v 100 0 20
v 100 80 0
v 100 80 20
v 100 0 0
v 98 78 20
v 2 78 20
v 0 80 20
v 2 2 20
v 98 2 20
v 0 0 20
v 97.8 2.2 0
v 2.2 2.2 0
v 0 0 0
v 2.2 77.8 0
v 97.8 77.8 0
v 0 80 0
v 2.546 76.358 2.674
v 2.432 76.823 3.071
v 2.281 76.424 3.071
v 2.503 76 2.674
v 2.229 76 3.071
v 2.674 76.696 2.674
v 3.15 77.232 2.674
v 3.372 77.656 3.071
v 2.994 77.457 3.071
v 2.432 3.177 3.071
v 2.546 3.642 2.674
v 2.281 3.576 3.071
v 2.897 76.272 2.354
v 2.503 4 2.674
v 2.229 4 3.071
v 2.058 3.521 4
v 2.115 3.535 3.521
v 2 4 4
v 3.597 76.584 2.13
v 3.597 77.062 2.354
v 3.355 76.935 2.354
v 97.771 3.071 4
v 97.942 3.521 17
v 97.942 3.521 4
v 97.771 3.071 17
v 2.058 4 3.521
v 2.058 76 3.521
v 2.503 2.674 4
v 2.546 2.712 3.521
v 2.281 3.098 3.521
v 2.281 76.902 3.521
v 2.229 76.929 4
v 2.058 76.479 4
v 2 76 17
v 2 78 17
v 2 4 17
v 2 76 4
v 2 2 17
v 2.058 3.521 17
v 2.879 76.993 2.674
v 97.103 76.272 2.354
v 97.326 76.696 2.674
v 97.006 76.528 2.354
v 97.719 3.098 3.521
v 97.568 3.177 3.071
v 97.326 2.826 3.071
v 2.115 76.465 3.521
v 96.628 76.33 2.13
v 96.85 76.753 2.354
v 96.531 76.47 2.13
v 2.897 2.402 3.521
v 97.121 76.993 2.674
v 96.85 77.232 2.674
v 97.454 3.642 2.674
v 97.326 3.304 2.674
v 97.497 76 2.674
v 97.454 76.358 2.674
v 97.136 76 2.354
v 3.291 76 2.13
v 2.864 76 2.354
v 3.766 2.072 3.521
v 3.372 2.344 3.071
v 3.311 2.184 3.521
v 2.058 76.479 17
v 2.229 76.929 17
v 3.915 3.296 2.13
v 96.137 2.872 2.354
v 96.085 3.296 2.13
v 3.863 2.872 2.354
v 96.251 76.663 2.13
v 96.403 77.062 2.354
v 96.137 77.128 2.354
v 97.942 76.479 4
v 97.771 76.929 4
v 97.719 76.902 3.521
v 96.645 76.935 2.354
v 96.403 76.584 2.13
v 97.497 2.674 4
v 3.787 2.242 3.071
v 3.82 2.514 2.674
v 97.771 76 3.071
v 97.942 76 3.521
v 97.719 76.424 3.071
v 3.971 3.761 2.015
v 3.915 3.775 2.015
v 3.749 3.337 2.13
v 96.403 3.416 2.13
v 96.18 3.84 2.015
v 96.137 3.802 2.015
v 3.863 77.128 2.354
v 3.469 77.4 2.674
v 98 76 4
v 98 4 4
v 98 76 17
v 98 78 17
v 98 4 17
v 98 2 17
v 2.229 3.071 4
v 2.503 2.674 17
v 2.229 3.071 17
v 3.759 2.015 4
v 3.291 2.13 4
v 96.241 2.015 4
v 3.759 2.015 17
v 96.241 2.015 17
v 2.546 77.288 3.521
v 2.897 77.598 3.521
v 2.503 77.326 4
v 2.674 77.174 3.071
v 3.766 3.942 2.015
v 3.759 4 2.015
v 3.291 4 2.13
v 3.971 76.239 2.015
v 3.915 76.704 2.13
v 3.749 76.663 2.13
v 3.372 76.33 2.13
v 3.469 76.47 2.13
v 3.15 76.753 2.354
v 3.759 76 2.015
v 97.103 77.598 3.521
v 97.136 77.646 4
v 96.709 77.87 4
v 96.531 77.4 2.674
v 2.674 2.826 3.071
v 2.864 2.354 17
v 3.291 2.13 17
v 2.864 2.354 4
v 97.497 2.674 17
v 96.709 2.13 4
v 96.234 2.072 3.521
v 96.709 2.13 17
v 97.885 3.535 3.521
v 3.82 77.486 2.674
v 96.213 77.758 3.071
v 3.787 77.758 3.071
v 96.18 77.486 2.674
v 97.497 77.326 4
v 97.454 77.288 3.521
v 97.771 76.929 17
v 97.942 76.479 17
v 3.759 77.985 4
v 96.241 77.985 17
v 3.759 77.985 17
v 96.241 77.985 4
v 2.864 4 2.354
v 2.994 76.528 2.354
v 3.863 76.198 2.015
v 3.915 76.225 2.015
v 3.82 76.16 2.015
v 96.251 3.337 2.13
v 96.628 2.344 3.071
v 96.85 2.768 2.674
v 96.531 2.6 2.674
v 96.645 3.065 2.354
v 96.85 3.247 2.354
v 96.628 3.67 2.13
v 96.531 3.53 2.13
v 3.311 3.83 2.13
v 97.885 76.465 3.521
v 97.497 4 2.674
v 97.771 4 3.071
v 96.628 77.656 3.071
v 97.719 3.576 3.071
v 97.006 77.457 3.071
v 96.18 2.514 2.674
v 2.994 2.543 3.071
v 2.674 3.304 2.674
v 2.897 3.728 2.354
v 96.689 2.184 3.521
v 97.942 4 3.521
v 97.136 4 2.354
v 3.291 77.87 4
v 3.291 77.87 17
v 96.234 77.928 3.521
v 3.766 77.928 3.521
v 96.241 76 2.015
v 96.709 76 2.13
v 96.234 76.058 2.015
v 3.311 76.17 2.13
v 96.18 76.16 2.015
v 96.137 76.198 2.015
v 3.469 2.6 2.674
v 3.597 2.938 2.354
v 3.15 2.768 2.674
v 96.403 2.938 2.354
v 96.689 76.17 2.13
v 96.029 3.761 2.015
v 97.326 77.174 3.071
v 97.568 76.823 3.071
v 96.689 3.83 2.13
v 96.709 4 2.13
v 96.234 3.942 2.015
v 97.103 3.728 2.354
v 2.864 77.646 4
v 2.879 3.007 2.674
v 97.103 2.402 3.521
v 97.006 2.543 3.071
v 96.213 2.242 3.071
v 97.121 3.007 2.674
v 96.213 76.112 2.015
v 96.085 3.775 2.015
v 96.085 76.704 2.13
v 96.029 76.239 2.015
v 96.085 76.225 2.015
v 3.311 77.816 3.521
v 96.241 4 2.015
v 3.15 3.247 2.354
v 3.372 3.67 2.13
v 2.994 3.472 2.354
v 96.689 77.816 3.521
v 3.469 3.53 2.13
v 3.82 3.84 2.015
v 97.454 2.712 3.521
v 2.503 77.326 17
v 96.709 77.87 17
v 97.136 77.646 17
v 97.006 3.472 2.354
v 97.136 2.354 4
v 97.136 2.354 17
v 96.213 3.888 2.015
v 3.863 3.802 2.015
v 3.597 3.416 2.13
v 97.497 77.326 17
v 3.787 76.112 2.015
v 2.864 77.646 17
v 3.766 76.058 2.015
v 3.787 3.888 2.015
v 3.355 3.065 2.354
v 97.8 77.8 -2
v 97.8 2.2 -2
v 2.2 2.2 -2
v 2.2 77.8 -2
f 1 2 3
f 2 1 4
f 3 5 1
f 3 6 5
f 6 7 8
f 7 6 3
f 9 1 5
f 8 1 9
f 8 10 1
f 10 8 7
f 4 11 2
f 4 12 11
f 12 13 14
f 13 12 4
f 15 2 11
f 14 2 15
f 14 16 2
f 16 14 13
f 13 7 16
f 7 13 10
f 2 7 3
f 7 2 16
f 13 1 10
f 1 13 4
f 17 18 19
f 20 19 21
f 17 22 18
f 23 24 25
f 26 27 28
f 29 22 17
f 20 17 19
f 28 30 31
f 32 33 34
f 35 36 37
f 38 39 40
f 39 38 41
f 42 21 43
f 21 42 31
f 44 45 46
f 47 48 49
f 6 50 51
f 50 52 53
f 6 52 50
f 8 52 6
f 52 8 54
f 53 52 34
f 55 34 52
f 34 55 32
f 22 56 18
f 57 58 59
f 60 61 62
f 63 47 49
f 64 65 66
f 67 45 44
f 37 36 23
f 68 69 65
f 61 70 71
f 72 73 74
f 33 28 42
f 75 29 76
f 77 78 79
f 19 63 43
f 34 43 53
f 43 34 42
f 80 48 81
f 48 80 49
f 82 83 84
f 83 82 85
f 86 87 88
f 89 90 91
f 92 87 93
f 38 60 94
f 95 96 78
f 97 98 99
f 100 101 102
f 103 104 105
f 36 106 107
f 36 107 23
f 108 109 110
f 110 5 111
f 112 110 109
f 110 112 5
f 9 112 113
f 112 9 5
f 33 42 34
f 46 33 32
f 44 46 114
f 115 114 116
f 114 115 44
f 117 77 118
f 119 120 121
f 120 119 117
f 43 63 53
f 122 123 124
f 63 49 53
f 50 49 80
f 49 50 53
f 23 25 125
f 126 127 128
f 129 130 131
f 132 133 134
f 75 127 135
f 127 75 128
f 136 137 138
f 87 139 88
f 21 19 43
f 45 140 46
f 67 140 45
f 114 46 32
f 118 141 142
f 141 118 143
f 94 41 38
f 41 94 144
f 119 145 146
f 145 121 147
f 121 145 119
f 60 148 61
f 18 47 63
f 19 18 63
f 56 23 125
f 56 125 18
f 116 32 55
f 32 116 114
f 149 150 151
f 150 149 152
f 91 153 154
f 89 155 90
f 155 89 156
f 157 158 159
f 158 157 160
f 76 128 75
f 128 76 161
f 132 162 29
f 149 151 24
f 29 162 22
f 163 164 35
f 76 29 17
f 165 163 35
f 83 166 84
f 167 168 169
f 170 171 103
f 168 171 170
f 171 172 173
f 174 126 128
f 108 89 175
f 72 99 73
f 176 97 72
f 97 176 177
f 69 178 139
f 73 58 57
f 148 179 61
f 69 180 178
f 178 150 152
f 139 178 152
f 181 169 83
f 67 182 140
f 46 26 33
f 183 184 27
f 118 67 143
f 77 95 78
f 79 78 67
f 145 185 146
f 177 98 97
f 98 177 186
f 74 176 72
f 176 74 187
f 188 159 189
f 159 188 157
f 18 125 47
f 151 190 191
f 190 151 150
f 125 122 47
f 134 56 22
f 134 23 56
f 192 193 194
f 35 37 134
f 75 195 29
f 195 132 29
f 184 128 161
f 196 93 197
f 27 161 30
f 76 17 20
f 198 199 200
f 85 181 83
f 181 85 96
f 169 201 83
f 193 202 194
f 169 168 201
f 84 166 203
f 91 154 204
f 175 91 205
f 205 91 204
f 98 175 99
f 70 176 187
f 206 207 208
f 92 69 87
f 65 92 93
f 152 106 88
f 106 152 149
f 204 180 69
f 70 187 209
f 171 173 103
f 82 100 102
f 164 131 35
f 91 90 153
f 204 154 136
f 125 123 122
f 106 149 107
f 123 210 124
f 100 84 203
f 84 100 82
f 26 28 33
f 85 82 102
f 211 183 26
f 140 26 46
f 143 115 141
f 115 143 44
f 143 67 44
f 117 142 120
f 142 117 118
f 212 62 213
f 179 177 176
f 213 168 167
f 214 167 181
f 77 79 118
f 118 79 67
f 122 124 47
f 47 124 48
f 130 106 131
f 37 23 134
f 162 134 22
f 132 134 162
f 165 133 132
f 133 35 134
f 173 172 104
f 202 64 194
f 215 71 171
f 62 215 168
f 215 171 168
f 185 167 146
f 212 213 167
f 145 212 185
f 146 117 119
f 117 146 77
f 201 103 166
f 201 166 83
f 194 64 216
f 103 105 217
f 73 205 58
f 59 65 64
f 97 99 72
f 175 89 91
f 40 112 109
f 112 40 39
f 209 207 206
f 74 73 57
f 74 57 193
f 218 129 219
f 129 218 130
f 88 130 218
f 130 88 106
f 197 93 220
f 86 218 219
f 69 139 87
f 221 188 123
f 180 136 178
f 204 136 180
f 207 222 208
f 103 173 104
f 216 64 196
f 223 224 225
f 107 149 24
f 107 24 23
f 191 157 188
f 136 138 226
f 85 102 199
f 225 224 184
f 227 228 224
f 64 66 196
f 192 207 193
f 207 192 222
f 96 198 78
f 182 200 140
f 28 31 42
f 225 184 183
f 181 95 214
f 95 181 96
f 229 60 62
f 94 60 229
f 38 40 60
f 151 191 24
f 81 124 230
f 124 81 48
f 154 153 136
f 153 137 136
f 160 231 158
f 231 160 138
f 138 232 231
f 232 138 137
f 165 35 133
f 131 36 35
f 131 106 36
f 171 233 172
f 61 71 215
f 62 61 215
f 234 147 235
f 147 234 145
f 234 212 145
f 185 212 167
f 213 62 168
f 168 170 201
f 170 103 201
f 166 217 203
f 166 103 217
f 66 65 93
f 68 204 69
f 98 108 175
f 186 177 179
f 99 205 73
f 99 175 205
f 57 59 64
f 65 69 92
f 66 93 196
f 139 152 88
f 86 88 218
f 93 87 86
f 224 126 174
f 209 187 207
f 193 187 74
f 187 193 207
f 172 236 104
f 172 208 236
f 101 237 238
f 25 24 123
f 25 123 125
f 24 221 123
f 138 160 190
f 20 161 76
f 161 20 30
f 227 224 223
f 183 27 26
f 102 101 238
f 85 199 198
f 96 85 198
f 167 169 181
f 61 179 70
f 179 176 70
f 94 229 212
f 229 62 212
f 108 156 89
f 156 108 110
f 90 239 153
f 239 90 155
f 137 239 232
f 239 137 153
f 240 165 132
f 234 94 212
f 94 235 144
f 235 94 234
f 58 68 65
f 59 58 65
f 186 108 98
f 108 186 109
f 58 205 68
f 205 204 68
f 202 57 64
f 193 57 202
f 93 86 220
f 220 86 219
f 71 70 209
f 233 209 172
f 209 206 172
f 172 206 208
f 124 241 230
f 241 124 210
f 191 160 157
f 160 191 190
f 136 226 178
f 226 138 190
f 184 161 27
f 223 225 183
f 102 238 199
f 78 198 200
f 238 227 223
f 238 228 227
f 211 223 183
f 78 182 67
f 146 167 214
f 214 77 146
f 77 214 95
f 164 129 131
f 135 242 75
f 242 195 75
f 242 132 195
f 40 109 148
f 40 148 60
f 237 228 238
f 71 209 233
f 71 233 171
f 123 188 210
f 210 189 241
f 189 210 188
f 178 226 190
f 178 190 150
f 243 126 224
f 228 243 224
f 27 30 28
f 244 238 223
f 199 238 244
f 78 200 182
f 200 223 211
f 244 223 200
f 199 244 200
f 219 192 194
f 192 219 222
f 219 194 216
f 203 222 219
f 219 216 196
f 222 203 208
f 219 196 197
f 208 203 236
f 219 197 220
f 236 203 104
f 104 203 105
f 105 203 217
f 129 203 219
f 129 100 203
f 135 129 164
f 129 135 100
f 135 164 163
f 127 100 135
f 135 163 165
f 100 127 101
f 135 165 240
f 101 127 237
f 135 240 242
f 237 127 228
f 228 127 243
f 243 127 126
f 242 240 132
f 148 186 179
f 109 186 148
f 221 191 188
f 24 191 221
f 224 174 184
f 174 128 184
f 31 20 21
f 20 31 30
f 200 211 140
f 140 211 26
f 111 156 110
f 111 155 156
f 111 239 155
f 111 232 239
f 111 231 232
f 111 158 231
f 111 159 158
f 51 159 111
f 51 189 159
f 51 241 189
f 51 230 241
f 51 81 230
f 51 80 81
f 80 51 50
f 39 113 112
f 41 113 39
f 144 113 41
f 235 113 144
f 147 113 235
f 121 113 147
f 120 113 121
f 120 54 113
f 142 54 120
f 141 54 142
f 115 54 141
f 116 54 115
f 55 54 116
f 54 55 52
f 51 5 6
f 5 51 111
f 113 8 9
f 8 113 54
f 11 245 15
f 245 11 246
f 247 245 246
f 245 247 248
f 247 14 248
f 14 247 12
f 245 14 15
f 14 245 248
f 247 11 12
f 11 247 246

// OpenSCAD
// jbox.scad
// Stackable Part Bins
// David O'Connor  david@lizardstation.com
// 24 August 2018

// Copyright Creative Commons Attribution Unported 3.0 (CC-BY-3.0)
//   See https://creativecommons.org/licenses/by/3.0/
//


// Box length
bx = 100; 
// Box width
by = 80;  
// Box or Lid?
box = 1; // [1:Box, 0:Lid]
// number of cells in the length direction
nx = 1; 
// number of cells in the width direction
ny = 1; 
// wall thickness 
wt = 2; 
// cell height
hc = 15;
// box height
hb = 20;
// fillet radius
rf = 2; 
// fit clearance 
fc = 0.20; 

$fa=5 * 1;
$fs=0.5 * 1;

if ((nx == 0) || (ny == 0) || (box == 0)) {    
    union() { 
        translate([0, 0, -wt])
            cube([bx , by, 2*wt]);
        translate([wt+fc, wt+fc, -0.5*fc])
            cube([bx-2*wt-2*fc, by-2*wt-2*fc, wt*2-fc]); 
    }
}
   
else {
        cx = (bx - (nx+1) * wt) / nx;
        cy = (by - (ny+1) * wt) / ny;
    union() {
        difference() {
            difference() {
                cube([nx*cx + (nx+1)*wt, ny*cy+(ny+1)*wt, hb]); 
                union() {
                    for (i = [1:nx]) {
                        for (j = [1:ny]) {
                            translate([(i-1)*(cx+wt)+wt+rf, (j-1)*(cy+wt)+wt+rf, wt+rf]) {
                                minkowski() {
                                    cube([cx-2*rf, cy-2*rf, hb-2*rf]);
                                    sphere(r = rf);
                                }  
                            }
                        }
                    }
                }
            }
            translate([wt, wt, (hc+wt)])
                cube([nx*cx + (nx-1)*wt , ny*cy+(ny-1)*wt, hb]); 
        }
        translate([wt+fc, wt+fc, -wt])
            cube([nx*cx + (nx-1)*wt - 2*fc , ny*cy+(ny-1)*wt - 2*fc, 1.99*wt]);
    }
}


       
